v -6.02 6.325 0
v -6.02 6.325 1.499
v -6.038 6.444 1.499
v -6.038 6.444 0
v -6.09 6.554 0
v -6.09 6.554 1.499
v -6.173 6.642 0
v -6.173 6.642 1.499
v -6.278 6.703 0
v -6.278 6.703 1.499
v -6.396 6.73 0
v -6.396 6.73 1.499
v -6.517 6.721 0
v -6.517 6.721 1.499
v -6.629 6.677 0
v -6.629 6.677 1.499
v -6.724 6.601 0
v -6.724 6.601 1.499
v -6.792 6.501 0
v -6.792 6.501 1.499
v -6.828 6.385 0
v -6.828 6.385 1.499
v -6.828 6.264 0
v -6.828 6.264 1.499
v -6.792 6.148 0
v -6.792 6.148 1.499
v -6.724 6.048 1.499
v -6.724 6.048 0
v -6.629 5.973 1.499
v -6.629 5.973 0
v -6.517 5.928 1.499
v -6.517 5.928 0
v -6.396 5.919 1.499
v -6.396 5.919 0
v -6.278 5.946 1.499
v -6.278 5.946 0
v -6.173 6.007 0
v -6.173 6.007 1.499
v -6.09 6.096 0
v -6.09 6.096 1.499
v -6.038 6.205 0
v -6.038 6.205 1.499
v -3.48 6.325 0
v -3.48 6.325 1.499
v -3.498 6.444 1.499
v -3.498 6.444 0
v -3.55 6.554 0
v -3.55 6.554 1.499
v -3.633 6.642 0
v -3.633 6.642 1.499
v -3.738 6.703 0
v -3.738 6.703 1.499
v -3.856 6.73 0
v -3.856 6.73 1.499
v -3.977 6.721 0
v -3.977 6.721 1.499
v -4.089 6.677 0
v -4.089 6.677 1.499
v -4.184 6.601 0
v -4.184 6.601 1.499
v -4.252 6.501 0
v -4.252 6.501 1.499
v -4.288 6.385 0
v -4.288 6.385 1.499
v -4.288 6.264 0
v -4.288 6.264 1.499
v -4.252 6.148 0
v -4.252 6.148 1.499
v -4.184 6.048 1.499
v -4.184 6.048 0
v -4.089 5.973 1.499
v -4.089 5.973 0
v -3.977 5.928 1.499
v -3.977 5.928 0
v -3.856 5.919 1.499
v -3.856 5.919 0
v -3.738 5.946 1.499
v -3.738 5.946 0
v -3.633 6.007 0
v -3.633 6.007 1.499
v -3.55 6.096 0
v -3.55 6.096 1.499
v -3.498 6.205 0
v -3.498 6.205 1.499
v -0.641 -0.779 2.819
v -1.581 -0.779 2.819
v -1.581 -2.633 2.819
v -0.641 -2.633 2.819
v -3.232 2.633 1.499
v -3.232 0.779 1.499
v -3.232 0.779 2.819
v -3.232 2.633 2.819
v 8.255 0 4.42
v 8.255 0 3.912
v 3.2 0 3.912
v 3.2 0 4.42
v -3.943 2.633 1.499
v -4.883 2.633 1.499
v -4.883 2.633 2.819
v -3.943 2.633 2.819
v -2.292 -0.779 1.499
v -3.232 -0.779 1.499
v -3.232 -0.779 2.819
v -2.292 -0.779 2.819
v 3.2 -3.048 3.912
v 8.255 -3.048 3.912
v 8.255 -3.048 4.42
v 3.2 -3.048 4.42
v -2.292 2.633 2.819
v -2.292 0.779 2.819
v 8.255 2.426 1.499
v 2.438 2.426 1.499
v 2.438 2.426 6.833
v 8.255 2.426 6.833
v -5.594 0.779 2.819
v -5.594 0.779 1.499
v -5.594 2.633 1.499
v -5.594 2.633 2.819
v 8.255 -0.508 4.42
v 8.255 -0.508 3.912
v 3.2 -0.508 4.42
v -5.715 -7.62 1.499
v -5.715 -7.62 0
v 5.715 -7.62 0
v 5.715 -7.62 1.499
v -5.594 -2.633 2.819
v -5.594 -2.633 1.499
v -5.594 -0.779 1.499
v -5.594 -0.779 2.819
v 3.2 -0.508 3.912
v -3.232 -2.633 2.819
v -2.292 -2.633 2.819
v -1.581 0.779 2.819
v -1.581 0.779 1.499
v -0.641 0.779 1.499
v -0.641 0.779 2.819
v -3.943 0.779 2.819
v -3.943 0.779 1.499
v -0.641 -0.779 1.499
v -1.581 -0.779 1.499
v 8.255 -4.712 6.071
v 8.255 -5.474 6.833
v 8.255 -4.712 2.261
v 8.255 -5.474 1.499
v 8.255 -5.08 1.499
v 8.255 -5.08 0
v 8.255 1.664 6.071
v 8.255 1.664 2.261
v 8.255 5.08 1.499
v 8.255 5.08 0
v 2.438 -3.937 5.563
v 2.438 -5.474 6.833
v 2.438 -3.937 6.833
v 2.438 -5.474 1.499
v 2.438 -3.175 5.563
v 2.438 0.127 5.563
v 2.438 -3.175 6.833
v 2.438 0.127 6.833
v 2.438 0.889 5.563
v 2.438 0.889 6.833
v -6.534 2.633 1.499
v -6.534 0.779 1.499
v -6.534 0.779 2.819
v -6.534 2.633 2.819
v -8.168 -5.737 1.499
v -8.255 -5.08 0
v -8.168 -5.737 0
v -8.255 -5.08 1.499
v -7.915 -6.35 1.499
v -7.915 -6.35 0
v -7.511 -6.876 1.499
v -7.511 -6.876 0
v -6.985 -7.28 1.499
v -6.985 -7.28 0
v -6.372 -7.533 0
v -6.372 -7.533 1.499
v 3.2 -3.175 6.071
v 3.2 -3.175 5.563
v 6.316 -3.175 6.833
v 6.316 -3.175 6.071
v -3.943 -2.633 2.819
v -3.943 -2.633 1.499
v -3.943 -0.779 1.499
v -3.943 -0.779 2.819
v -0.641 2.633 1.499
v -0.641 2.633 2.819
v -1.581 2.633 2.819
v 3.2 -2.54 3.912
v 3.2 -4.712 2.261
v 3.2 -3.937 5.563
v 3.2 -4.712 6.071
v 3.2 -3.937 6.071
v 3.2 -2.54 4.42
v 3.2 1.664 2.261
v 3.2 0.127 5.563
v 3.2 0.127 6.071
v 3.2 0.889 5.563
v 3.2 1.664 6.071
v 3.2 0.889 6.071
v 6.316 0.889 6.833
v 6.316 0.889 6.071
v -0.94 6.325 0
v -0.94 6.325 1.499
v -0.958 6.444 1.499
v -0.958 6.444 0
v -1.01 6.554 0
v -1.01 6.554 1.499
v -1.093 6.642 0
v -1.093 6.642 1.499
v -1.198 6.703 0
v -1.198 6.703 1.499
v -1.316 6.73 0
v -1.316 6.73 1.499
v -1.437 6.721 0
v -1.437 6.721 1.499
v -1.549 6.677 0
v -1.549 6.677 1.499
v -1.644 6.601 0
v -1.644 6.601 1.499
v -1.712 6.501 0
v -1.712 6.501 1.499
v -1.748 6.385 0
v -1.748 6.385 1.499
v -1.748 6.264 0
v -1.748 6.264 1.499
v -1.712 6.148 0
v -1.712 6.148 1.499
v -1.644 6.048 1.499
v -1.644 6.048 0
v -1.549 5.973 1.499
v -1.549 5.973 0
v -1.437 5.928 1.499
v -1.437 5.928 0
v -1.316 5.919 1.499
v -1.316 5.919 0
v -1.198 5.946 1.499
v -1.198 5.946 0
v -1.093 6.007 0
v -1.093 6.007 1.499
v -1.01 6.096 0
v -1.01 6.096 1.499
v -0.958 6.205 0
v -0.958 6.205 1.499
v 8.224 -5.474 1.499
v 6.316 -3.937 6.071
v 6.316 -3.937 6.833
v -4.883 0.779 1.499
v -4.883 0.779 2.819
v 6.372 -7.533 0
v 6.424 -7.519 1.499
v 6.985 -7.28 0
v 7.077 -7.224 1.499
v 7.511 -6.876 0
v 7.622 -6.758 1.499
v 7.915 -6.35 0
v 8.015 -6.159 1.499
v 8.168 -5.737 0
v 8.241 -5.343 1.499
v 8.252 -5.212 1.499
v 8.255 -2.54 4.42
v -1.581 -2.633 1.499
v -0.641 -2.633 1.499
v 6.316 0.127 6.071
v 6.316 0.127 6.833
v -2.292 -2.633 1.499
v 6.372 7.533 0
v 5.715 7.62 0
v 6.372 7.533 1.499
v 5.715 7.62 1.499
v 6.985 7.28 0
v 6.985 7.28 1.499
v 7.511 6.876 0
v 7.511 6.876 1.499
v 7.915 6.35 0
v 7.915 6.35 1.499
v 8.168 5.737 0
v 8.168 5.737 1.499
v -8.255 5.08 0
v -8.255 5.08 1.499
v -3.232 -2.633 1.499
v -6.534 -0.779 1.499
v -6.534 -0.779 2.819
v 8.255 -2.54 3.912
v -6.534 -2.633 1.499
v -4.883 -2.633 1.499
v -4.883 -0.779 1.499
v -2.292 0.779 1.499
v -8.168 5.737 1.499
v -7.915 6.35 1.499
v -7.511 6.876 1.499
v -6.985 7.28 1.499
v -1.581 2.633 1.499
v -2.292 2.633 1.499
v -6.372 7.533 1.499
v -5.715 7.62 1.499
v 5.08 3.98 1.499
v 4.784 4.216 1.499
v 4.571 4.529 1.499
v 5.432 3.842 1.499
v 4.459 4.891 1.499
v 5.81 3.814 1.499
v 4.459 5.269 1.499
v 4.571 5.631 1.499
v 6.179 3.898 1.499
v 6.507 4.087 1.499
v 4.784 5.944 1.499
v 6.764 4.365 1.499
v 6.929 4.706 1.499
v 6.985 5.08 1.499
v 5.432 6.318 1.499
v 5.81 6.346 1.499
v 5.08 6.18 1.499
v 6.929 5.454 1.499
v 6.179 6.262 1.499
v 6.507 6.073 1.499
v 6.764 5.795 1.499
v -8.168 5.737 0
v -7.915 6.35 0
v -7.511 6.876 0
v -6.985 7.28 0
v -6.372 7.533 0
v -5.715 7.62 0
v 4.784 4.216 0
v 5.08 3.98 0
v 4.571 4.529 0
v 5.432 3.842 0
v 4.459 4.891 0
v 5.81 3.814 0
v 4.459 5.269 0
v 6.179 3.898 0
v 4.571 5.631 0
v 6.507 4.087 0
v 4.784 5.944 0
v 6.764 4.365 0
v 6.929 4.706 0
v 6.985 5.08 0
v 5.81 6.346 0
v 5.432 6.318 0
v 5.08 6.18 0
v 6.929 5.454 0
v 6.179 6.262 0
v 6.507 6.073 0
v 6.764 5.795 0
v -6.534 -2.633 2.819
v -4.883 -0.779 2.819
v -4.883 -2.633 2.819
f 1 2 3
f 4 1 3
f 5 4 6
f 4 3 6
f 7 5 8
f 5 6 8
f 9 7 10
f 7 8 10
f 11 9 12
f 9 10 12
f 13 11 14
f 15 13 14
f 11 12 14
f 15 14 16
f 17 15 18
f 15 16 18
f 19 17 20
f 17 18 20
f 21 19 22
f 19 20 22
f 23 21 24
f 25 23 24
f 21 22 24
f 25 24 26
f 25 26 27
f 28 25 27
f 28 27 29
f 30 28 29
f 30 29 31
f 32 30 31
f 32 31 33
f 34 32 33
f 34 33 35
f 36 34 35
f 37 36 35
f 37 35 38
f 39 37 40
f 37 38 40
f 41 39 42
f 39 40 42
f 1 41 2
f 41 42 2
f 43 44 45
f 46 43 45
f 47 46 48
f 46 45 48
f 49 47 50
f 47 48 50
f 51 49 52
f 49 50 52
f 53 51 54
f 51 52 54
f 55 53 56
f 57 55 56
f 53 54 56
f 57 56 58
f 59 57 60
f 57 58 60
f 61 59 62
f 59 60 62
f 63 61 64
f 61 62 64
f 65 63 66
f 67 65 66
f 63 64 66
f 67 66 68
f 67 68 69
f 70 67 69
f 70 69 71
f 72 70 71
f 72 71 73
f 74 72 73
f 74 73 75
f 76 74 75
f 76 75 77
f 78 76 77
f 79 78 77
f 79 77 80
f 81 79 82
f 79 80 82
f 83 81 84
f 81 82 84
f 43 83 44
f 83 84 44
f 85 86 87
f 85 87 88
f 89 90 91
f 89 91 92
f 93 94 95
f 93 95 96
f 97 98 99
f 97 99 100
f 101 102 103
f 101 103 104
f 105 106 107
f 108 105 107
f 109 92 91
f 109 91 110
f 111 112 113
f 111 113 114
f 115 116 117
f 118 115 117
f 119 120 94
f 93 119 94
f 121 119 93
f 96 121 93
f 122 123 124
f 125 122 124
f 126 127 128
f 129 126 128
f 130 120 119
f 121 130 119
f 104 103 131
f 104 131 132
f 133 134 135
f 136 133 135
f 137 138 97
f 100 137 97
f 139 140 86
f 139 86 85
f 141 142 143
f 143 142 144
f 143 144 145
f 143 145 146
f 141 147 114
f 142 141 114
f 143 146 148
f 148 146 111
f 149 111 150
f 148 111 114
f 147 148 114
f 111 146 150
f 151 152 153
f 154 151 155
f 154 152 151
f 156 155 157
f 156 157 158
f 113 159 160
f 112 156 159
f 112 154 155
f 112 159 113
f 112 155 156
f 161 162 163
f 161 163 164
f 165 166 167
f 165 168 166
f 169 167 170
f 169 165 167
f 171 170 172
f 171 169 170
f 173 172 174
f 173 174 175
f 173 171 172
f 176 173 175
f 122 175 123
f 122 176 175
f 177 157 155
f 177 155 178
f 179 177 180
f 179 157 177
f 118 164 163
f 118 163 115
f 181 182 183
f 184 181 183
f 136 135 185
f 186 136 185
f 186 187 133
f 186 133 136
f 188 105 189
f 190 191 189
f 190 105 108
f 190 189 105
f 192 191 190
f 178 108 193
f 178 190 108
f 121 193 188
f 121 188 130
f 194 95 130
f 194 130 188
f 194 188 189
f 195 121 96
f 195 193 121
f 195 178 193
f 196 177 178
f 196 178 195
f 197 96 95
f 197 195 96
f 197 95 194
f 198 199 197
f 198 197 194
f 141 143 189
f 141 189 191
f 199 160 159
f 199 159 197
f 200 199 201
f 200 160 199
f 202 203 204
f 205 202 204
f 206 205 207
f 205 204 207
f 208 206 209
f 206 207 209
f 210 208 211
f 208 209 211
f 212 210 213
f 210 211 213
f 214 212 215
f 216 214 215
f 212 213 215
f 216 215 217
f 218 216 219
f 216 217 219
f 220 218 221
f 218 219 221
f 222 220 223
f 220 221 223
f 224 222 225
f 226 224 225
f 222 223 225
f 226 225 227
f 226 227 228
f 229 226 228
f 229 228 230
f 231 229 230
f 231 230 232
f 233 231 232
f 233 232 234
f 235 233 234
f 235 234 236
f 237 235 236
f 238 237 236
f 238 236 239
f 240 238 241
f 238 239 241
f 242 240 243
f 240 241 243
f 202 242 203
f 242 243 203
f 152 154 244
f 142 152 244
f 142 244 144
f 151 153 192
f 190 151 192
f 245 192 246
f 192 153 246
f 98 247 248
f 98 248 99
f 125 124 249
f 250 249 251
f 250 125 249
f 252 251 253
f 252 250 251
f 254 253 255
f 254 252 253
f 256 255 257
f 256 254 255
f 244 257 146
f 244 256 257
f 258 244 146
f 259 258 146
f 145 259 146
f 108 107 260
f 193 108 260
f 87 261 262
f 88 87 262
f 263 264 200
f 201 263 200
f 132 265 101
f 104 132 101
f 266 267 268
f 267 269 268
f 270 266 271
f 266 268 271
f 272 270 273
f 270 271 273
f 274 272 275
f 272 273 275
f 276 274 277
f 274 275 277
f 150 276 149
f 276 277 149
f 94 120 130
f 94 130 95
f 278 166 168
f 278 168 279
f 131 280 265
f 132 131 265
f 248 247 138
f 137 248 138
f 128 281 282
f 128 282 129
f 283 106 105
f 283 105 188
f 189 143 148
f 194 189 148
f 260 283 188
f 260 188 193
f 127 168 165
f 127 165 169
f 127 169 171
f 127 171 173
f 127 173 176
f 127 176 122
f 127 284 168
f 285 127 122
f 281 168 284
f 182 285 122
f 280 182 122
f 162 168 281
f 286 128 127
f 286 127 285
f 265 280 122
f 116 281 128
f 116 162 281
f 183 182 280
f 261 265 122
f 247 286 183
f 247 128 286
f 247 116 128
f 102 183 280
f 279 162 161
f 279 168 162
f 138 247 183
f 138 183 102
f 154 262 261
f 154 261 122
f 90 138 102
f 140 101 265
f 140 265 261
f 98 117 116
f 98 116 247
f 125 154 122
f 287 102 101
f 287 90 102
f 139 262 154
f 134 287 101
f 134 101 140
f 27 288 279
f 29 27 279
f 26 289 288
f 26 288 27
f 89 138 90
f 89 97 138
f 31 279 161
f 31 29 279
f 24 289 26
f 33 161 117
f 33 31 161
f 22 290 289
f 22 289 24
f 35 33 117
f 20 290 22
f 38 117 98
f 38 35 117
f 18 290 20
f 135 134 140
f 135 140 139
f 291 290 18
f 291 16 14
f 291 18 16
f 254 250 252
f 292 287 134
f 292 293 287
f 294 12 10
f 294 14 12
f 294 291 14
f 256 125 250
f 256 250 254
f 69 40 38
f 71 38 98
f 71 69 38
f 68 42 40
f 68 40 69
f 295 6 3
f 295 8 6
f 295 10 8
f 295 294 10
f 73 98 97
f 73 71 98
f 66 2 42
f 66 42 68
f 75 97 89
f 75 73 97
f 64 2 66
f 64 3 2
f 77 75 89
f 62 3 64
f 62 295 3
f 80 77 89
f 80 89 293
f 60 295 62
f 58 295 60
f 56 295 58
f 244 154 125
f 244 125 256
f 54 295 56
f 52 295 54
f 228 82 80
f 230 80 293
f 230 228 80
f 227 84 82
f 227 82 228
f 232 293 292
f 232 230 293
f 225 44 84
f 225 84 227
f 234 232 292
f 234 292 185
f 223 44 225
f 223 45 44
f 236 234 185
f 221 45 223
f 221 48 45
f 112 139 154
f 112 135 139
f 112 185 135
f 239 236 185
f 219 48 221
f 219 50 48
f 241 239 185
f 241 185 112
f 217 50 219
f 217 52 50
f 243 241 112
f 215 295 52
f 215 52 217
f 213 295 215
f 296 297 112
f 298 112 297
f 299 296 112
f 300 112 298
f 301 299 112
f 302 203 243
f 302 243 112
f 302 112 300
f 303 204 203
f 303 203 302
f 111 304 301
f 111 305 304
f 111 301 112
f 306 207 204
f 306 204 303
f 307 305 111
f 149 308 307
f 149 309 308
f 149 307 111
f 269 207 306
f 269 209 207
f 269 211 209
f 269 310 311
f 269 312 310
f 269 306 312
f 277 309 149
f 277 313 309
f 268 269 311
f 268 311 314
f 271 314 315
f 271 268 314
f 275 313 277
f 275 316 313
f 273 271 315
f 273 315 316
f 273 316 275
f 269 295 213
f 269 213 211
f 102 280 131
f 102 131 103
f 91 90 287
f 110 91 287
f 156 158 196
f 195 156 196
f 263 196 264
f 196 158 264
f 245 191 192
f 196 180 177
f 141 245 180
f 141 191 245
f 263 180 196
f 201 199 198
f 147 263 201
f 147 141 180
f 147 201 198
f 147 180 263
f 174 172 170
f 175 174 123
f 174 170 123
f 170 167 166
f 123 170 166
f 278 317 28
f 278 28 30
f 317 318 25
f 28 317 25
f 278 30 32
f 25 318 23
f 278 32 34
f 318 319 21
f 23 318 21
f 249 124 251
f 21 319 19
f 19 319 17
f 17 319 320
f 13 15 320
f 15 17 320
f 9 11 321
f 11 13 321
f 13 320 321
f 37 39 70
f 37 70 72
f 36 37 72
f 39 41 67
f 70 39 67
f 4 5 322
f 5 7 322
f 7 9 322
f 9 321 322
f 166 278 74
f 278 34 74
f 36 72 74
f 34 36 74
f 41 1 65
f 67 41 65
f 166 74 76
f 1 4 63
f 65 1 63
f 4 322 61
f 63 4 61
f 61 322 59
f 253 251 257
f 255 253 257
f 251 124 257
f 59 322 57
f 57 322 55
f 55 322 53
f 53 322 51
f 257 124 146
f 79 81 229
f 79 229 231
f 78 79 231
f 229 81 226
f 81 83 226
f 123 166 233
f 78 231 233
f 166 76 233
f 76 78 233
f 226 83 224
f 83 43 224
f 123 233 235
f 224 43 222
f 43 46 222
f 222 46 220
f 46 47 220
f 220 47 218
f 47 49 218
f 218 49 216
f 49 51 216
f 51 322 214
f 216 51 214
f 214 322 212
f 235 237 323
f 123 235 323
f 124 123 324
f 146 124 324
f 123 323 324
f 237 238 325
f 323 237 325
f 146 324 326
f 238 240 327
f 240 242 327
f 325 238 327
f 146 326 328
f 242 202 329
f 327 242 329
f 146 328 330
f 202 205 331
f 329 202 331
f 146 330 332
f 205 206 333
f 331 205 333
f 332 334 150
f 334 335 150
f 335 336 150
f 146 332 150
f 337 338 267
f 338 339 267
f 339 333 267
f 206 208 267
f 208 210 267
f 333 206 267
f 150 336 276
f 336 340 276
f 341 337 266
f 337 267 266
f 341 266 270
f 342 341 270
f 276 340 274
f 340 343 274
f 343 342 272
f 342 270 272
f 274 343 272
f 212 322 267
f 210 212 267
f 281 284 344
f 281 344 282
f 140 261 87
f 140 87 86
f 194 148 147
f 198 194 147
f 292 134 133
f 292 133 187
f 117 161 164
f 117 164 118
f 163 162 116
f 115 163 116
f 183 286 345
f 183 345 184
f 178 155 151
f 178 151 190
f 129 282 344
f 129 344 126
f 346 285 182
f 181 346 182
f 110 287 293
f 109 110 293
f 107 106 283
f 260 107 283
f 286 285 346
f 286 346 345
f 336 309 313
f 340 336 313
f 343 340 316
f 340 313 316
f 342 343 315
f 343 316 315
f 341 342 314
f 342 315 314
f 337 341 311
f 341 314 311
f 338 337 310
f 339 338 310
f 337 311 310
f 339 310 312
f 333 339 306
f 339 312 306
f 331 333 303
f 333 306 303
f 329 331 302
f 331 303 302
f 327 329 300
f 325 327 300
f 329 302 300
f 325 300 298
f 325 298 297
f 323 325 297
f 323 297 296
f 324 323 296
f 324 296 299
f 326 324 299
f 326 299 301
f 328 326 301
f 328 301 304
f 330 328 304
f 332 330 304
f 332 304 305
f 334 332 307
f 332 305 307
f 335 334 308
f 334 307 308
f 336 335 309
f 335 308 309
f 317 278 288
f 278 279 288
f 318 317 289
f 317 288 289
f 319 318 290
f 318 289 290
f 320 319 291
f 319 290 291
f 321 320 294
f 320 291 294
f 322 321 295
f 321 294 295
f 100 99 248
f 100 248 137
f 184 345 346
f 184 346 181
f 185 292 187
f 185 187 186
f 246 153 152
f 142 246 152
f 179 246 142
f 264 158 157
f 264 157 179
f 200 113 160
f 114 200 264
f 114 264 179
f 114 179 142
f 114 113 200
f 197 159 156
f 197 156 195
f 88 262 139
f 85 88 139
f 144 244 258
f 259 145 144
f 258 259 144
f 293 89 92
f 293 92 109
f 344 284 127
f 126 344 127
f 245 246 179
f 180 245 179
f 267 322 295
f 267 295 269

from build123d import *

# Parameters (mm, degrees)
F0_W      = 16.51
F0_H      = 15.24
F1_DEPTH  = 1.4986
F2_R      = 1.27
F3_DEPTH  = 1.4986
F4_R      = 2.54
F5_W      = 5.8166
F5_H      = 7.8994
F6_DEPTH  = 5.334
F7_W      = 6.3754
F7_H      = 3.81
F7_W_2    = 0.508
F7_H_2    = 0.508
F8_DEPTH  = 5.0546
F9_W      = 3.8771615364
F9_H      = 0.762
F10_DEPTH = 1.27
F11_R     = 0.4064
F12_DEPTH = 1.4986
F13_W     = 0.9398
F13_H     = 1.8542
F14_DEPTH = 1.3208


with BuildPart() as f1:
    # F0 (on Top) → F1 (new body)
    with BuildSketch(Plane.XY):
        Rectangle(F0_W, F0_H)
    extrude(amount=F1_DEPTH)

    # F2 (on face) → F3 (cut, through all)
    with BuildSketch(Plane.XY.offset(1.4986)):
        with Locations((5.715, 5.08)):
            Circle(F2_R)
    extrude(amount=-F3_DEPTH, mode=Mode.SUBTRACT)

    # F4
    f4_edges = [f1.edges().sort_by_distance(p)[0] for p in [
        (8.255, -7.62, 0.7493),
        (8.255, 7.62, 0.7493),
        (-8.255, -7.62, 0.7493),
        (-8.255, 7.62, 0.7493),
    ]]
    fillet(f4_edges, radius=F4_R)

    # F5 (on face) → F6 (join)
    with BuildSketch(Plane.XY.offset(1.4986)):
        with Locations((5.3467, -1.524)):
            Rectangle(F5_W, F5_H)
    extrude(amount=F6_DEPTH)

    # F7 (on face) → F8 (cut, through all)
    with BuildSketch(Plane.YZ.offset(8.255)):
        with Locations((-1.524, 4.1656)):
            Rectangle(F7_W, F7_H)
        with Locations((-2.794, 4.1656)):
            Rectangle(F7_W_2, F7_H_2, mode=Mode.SUBTRACT)
        with Locations((-0.254, 4.1656)):
            Rectangle(F7_W_2, F7_H_2, mode=Mode.SUBTRACT)
    extrude(amount=-F8_DEPTH, mode=Mode.SUBTRACT)

    # F9 (on face) → F10 (cut)
    with BuildSketch(Plane.XY.offset(6.8326)):
        with Locations((4.3769807682, 0.508)):
            Rectangle(F9_W, F9_H)
        with Locations((4.3769807682, -3.556)):
            Rectangle(F9_W, F9_H)
    extrude(amount=-F10_DEPTH, mode=Mode.SUBTRACT)

    # F11 (on face) → F12 (cut, through all)
    with BuildSketch(Plane.XY.offset(1.4986)):
        with Locations((-6.4262, 6.3246)):
            Circle(F11_R)
        with Locations((-3.8862, 6.3246)):
            Circle(F11_R)
        with Locations((-1.3462, 6.3246)):
            Circle(F11_R)
    extrude(amount=-F12_DEPTH, mode=Mode.SUBTRACT)

    # F13 (on face) → F14 (join)
    with BuildSketch(Plane.XY.offset(1.4986)):
        with Locations((-6.0639006243, 1.7056578491)):
            Rectangle(F13_W, F13_H)
        with Locations((-4.4129006243, 1.7056578491)):
            Rectangle(F13_W, F13_H)
        with Locations((-2.7619006243, 1.7056578491)):
            Rectangle(F13_W, F13_H)
        with Locations((-1.1109006243, 1.7056578491)):
            Rectangle(F13_W, F13_H)
        with Locations((-6.0639006243, -1.7056578491)):
            Rectangle(F13_W, F13_H)
        with Locations((-1.1109006243, -1.7056578491)):
            Rectangle(F13_W, F13_H)
        with Locations((-4.4129006243, -1.7056578491)):
            Rectangle(F13_W, F13_H)
        with Locations((-2.7619006243, -1.7056578491)):
            Rectangle(F13_W, F13_H)
    extrude(amount=F14_DEPTH)


solid = f1.part
